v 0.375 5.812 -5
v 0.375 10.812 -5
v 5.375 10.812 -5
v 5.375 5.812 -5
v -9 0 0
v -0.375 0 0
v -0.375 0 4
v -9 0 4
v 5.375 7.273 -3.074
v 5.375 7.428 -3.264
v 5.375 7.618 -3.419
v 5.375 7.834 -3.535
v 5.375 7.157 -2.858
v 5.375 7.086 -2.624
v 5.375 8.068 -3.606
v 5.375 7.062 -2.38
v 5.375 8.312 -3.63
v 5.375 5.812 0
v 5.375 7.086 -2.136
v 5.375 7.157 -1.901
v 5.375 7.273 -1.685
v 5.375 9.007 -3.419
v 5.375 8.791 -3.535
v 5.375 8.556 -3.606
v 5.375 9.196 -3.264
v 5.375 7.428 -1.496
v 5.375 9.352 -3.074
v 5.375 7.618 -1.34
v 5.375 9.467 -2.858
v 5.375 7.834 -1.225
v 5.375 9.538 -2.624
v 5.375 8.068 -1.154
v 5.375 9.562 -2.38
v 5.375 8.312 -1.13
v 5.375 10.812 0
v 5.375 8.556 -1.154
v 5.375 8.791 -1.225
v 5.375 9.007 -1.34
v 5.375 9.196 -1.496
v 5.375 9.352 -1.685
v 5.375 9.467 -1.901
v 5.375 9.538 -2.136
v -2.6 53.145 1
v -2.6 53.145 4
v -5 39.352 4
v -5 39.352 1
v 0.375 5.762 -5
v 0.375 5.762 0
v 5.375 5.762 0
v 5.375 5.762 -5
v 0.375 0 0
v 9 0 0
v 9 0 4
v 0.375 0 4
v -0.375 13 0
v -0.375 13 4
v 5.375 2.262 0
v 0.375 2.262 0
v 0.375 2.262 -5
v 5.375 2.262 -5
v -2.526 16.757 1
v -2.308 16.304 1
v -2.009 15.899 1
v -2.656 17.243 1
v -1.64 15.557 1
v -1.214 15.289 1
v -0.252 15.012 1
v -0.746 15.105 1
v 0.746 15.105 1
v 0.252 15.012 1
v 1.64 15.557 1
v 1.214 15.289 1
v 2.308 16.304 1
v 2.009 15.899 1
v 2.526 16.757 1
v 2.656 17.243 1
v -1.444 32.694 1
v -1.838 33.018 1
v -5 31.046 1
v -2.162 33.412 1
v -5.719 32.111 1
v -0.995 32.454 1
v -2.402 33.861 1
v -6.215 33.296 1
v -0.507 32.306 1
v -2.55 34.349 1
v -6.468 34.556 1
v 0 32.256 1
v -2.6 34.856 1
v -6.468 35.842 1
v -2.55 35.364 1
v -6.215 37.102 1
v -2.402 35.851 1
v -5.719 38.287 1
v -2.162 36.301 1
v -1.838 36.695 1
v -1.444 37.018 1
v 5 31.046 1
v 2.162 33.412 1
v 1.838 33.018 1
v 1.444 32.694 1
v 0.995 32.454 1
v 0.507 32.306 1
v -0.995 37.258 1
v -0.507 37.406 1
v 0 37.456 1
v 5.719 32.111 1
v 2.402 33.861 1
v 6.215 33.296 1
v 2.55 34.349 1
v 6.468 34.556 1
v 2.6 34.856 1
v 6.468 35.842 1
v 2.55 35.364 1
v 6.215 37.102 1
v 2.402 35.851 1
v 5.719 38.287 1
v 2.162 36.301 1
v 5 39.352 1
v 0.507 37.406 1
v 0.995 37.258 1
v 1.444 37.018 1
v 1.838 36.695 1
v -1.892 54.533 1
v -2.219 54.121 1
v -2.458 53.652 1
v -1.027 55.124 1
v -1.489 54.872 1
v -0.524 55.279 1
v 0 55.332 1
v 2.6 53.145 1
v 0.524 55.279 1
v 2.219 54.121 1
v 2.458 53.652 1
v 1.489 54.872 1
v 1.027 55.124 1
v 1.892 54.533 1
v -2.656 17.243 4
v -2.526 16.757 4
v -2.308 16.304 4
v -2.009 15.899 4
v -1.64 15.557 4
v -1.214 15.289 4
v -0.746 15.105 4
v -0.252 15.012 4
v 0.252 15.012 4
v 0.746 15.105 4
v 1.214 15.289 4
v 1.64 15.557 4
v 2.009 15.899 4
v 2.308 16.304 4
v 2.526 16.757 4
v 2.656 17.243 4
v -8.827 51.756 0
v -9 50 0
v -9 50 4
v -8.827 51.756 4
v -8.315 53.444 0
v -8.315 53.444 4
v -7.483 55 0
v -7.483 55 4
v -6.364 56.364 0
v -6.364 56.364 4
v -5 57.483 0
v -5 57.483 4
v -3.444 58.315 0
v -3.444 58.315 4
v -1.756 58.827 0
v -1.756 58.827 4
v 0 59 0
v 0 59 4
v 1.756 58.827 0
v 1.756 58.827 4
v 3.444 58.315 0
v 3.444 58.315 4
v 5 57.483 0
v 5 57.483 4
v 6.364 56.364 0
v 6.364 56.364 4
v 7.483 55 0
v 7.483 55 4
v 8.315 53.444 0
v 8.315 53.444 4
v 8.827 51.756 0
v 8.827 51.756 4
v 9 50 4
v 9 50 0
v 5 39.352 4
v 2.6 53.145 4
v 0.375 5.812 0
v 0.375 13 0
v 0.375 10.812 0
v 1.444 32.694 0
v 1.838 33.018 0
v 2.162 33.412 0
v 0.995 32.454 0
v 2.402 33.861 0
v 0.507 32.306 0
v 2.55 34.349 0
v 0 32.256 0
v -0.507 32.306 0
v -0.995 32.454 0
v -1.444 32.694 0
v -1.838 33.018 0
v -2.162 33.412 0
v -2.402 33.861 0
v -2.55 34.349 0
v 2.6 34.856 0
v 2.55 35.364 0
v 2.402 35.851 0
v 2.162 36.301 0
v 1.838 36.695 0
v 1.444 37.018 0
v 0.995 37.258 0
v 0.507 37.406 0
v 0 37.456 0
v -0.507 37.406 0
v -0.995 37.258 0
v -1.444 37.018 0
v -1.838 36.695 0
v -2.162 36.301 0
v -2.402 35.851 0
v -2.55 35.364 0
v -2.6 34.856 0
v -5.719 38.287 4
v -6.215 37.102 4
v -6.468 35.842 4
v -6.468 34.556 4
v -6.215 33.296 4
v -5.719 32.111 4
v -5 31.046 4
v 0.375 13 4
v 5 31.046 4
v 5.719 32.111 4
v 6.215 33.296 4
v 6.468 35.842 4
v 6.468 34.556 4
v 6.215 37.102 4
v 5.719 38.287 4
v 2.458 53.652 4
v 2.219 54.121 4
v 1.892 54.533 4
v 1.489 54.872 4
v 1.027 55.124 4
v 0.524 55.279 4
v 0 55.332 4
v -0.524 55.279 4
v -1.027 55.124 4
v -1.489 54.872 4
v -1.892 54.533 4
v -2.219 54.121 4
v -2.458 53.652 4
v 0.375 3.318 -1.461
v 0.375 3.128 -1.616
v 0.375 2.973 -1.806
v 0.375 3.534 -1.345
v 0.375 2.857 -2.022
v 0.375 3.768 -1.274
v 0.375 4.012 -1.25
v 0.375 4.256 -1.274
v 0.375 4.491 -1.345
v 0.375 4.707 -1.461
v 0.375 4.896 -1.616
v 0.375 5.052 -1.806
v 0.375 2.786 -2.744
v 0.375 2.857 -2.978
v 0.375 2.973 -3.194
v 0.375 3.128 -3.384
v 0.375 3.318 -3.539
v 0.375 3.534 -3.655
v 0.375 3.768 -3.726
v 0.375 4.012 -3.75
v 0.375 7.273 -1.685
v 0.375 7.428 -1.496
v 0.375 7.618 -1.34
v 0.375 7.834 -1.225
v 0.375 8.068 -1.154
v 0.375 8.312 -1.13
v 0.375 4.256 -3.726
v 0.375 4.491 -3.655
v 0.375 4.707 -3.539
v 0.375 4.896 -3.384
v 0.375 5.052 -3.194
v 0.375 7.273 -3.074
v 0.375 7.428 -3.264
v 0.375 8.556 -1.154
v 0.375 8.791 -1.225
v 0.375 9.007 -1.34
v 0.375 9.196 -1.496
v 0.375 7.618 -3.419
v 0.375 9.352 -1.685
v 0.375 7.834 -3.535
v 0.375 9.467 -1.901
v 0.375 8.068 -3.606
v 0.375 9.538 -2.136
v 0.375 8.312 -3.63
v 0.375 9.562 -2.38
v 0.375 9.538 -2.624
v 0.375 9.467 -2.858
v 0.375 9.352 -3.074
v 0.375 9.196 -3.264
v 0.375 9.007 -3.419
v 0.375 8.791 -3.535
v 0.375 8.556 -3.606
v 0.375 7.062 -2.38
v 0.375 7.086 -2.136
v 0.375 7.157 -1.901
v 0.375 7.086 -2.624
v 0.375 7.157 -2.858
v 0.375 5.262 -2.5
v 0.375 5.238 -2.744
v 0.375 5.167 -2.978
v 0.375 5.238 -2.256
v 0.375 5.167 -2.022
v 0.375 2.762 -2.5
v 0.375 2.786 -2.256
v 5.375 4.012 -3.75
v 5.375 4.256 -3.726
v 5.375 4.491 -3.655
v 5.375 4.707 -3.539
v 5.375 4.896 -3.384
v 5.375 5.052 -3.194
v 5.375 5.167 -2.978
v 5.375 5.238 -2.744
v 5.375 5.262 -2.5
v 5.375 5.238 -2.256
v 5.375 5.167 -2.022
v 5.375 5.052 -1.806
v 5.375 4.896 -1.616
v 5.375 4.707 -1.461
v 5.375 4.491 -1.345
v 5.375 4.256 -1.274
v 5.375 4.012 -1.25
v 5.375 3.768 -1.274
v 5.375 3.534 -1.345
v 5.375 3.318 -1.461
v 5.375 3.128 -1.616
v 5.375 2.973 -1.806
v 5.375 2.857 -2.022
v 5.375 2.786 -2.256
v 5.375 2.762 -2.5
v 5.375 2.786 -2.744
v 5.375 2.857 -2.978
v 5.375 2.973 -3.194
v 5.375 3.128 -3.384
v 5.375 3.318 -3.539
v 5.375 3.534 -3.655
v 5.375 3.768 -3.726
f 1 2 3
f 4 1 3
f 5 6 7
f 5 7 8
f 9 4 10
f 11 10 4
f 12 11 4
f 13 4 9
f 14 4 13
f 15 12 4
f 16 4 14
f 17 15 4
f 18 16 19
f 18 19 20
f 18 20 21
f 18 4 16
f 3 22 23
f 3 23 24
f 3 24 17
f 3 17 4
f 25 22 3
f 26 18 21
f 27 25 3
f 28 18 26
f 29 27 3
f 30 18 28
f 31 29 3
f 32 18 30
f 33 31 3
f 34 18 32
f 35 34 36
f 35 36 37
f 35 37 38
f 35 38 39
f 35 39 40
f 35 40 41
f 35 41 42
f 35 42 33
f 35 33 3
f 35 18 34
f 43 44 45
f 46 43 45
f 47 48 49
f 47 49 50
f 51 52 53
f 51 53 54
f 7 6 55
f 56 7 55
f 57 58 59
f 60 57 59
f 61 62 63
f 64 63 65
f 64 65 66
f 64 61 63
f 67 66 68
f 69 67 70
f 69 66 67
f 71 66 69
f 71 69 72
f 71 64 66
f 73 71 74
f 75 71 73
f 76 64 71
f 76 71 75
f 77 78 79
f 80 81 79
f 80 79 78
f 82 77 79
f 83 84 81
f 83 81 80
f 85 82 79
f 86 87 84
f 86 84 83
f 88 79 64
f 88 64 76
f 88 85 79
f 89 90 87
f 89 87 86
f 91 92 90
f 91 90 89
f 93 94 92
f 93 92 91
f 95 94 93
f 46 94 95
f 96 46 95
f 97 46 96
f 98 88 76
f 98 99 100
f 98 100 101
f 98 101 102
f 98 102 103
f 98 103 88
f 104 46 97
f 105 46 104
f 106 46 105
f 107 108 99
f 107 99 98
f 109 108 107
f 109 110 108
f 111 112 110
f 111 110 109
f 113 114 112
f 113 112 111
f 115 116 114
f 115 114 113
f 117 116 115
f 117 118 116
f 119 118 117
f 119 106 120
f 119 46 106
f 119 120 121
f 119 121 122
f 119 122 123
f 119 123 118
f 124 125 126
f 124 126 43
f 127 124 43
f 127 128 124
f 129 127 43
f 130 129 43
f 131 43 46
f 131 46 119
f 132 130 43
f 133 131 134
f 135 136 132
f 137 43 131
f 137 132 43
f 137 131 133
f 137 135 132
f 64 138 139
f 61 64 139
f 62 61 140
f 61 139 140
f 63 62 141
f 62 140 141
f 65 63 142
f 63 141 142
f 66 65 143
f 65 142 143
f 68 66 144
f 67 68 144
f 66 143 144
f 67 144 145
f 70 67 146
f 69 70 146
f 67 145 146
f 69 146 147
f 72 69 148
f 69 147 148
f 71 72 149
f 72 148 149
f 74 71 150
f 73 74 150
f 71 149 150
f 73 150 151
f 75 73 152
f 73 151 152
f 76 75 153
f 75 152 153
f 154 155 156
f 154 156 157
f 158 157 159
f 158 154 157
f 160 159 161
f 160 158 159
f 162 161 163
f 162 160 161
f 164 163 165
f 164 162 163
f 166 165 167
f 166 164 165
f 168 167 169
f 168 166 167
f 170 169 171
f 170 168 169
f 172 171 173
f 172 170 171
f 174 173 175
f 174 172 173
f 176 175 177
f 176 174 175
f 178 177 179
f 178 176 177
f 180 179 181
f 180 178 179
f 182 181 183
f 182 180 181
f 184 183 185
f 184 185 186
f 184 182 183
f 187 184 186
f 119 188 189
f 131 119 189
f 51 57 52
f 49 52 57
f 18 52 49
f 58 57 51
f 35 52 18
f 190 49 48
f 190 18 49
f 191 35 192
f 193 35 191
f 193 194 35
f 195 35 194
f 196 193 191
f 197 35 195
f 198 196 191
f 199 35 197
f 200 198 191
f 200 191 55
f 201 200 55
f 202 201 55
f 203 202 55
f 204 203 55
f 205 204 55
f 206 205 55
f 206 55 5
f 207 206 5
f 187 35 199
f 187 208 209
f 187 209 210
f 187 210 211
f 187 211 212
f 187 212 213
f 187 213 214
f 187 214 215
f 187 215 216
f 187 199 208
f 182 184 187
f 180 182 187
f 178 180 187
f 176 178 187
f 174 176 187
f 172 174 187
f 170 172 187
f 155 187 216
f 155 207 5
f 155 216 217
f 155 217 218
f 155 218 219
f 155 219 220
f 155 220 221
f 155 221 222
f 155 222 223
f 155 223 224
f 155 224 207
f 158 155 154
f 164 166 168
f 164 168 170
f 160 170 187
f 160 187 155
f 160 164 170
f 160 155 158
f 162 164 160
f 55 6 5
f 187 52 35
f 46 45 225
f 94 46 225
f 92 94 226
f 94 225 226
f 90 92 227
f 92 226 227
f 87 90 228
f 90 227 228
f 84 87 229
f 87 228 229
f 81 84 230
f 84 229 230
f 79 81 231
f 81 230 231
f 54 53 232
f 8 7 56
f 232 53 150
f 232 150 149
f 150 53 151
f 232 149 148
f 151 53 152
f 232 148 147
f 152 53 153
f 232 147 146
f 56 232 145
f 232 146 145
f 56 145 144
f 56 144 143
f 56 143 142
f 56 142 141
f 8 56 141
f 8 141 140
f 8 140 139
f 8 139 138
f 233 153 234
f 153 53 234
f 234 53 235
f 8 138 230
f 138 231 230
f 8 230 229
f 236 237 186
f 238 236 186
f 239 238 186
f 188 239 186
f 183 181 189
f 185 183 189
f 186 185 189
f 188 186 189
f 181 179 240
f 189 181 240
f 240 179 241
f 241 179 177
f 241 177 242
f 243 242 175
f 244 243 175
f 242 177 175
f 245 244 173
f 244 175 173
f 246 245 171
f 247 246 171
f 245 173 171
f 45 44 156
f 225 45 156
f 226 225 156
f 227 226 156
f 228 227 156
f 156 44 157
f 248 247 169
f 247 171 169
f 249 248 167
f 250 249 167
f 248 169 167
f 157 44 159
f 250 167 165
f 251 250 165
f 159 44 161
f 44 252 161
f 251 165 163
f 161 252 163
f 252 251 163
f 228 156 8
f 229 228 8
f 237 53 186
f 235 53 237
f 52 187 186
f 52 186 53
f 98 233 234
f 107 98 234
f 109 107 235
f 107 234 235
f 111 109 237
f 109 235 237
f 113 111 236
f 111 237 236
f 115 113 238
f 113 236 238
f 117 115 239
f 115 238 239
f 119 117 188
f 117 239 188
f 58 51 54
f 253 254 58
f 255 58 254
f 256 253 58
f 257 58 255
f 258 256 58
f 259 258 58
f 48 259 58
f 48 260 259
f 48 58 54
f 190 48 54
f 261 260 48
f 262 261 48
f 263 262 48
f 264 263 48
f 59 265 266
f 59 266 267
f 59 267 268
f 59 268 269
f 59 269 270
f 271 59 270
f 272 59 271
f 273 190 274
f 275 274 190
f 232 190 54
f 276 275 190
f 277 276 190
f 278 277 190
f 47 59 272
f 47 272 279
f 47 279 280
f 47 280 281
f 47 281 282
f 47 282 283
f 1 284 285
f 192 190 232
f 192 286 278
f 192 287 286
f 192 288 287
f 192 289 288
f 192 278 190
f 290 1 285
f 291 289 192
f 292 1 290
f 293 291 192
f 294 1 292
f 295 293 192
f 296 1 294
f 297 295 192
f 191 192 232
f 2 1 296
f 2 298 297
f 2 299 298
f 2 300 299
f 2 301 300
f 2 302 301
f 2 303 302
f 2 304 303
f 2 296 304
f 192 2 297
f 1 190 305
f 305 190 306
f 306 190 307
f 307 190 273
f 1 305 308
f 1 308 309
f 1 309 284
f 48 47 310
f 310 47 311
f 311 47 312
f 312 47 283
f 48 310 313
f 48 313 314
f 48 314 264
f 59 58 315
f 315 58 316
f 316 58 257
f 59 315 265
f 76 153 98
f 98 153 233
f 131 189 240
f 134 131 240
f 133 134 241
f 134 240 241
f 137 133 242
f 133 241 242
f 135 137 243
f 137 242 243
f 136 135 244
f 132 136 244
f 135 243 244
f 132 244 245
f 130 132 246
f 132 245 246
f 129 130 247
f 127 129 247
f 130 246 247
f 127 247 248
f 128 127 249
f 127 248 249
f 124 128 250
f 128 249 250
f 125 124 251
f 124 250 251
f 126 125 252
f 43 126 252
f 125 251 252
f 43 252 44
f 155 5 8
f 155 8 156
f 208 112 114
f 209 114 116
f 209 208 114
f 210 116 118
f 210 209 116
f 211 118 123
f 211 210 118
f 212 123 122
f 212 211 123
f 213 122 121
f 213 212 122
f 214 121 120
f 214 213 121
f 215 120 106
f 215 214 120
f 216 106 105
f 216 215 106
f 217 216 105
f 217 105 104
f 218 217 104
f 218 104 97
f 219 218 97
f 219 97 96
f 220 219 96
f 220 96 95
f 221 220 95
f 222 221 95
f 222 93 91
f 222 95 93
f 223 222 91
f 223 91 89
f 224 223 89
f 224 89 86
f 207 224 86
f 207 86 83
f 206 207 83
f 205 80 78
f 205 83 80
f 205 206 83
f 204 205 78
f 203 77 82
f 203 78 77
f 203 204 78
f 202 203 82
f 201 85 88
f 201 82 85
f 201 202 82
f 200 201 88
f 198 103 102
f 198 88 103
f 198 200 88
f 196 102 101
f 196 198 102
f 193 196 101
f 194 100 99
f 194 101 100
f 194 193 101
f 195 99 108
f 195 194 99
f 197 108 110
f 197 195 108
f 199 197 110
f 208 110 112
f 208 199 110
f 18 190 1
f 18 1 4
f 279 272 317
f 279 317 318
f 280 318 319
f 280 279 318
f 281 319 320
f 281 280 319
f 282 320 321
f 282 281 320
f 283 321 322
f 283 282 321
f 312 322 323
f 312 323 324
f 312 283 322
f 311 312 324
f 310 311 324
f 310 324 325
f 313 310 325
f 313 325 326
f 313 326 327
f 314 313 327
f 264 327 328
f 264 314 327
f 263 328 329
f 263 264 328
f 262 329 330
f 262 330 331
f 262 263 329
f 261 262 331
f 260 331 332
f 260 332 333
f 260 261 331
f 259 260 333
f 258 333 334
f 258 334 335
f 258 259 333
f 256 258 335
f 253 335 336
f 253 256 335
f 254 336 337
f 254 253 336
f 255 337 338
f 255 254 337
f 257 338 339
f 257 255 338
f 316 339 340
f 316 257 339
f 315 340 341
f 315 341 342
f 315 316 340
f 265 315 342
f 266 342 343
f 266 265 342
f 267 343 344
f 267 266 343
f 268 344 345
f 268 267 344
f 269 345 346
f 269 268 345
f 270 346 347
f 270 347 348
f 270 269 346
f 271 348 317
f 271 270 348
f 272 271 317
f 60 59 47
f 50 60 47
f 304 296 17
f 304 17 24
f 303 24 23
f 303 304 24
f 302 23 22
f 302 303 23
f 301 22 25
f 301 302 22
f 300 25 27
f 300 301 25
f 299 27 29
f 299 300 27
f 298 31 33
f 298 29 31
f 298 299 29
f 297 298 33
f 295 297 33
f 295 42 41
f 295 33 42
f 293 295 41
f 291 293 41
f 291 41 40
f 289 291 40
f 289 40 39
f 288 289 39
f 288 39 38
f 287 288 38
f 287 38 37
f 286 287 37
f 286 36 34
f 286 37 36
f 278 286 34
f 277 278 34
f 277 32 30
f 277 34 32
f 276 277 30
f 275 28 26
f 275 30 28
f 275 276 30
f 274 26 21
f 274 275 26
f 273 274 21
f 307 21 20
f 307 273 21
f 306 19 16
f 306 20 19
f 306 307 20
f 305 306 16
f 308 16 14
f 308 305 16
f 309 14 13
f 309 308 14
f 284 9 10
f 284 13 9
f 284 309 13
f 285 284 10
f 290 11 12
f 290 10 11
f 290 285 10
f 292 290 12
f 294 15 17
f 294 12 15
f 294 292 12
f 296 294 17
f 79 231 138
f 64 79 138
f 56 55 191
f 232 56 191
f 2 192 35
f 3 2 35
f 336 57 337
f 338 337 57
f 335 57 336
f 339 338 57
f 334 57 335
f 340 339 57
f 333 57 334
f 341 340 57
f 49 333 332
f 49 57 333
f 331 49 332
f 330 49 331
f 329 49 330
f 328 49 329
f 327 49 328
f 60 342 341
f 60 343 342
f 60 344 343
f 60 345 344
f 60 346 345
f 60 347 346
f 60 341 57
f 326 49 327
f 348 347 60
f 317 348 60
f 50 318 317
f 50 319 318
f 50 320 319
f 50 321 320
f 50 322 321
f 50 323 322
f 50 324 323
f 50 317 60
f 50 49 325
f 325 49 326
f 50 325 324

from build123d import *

# Parameters (mm, degrees)
EXTRUDE_1_DEPTH          = 4
CUT_EXTRUDE_1_DEPTH      = 3
SKETCH_4_R               = 2.6
CUT_EXTRUDE_9_DEPTH      = 19
CUT_EXTRUDE_9_DEPTH_BACK = 2
SKETCH_5_W               = 0.75
SKETCH_5_H               = 13
CUT_EXTRUDE_11_DEPTH     = 5
SKETCH_8_W               = 5
SKETCH_8_H               = 5
EXTRUDE_2_DEPTH          = 5
SKETCH_9_R               = 1.25
CUT_EXTRUDE_12_DEPTH     = 39
SKETCH_11_W              = 5
SKETCH_11_H              = 3.5
SKETCH_11_R              = 1.25
EXTRUDE_4_DEPTH          = 5


with BuildPart() as part:
    # 草圖1 → 填料-伸長1 (new body)
    with BuildSketch(Plane.XY):
        with BuildLine():
            Line((-9, 0), (-9, 50))
            ThreePointArc((-9, 50), (0, 59), (9, 50))
            Line((9, 50), (9, 0))
            Line((9, 0), (-9, 0))
        make_face()
    extrude(amount=EXTRUDE_1_DEPTH)

    # 草圖2 → 除料-伸長1 (cut)
    with BuildSketch(Plane.XY.offset(4)):
        with BuildLine():
            Line((-2.6, 53.145110573), (-5, 39.352358854))
            ThreePointArc((-5, 39.352358854), (-6.5, 35.199046922), (-5, 31.045734991))
            Line((-5, 31.045734991), (-2.656326538, 17.243300615))
            ThreePointArc((-2.656326538, 17.243300615), (0, 15), (2.656326538, 17.243300615))
            Line((2.656326538, 17.243300615), (5, 31.045734991))
            ThreePointArc((5, 31.045734991), (6.5, 35.199046922), (5, 39.352358854))
            Line((5, 39.352358854), (2.6, 53.145110573))
            ThreePointArc((2.6, 53.145110573), (0, 55.331766334), (-2.6, 53.145110573))
        make_face()
    extrude(amount=-CUT_EXTRUDE_1_DEPTH, mode=Mode.SUBTRACT)

    # 草圖4 → 除料-伸長9 (cut, two sides)
    with BuildSketch(Plane.XY) as cut_extrude_9_sk:
        with Locations((0, 34.856314216)):
            Circle(SKETCH_4_R)
    extrude(amount=CUT_EXTRUDE_9_DEPTH, mode=Mode.SUBTRACT)
    extrude(cut_extrude_9_sk.sketch, amount=-CUT_EXTRUDE_9_DEPTH_BACK, mode=Mode.SUBTRACT)

    # 草圖5 → 除料-伸長11 (cut, through all)
    with BuildSketch(Plane.XY):
        with Locations((0, 6.5)):
            Rectangle(SKETCH_5_W, SKETCH_5_H)
    extrude(amount=CUT_EXTRUDE_11_DEPTH, mode=Mode.SUBTRACT)

    # 草圖8 → 填料-伸長2 (add)
    with BuildSketch(Plane.XY):
        with Locations((2.875, 8.312164066)):
            Rectangle(SKETCH_8_W, SKETCH_8_H)
    extrude(amount=-EXTRUDE_2_DEPTH)

    # 草圖9 → 除料-伸長12 (cut)
    with BuildSketch(Plane(origin=(0, 0, 0), x_dir=(0, 0, -1), z_dir=(1, 0, 0))):
        with Locations((2.379774756, 8.312164066)):
            Circle(SKETCH_9_R)
    extrude(amount=CUT_EXTRUDE_12_DEPTH, mode=Mode.SUBTRACT)

    # 草圖11 → 填料-伸長4 (add)
    with BuildSketch(Plane(origin=(0.375, 0, 0), x_dir=(0, 0, -1), z_dir=(1, 0, 0))):
        with Locations((2.5, 4.012164066)):
            Rectangle(SKETCH_11_W, SKETCH_11_H)
        with Locations((2.5, 4.012164066)):
            Circle(SKETCH_11_R, mode=Mode.SUBTRACT)
    extrude(amount=EXTRUDE_4_DEPTH)


solid = part.part
